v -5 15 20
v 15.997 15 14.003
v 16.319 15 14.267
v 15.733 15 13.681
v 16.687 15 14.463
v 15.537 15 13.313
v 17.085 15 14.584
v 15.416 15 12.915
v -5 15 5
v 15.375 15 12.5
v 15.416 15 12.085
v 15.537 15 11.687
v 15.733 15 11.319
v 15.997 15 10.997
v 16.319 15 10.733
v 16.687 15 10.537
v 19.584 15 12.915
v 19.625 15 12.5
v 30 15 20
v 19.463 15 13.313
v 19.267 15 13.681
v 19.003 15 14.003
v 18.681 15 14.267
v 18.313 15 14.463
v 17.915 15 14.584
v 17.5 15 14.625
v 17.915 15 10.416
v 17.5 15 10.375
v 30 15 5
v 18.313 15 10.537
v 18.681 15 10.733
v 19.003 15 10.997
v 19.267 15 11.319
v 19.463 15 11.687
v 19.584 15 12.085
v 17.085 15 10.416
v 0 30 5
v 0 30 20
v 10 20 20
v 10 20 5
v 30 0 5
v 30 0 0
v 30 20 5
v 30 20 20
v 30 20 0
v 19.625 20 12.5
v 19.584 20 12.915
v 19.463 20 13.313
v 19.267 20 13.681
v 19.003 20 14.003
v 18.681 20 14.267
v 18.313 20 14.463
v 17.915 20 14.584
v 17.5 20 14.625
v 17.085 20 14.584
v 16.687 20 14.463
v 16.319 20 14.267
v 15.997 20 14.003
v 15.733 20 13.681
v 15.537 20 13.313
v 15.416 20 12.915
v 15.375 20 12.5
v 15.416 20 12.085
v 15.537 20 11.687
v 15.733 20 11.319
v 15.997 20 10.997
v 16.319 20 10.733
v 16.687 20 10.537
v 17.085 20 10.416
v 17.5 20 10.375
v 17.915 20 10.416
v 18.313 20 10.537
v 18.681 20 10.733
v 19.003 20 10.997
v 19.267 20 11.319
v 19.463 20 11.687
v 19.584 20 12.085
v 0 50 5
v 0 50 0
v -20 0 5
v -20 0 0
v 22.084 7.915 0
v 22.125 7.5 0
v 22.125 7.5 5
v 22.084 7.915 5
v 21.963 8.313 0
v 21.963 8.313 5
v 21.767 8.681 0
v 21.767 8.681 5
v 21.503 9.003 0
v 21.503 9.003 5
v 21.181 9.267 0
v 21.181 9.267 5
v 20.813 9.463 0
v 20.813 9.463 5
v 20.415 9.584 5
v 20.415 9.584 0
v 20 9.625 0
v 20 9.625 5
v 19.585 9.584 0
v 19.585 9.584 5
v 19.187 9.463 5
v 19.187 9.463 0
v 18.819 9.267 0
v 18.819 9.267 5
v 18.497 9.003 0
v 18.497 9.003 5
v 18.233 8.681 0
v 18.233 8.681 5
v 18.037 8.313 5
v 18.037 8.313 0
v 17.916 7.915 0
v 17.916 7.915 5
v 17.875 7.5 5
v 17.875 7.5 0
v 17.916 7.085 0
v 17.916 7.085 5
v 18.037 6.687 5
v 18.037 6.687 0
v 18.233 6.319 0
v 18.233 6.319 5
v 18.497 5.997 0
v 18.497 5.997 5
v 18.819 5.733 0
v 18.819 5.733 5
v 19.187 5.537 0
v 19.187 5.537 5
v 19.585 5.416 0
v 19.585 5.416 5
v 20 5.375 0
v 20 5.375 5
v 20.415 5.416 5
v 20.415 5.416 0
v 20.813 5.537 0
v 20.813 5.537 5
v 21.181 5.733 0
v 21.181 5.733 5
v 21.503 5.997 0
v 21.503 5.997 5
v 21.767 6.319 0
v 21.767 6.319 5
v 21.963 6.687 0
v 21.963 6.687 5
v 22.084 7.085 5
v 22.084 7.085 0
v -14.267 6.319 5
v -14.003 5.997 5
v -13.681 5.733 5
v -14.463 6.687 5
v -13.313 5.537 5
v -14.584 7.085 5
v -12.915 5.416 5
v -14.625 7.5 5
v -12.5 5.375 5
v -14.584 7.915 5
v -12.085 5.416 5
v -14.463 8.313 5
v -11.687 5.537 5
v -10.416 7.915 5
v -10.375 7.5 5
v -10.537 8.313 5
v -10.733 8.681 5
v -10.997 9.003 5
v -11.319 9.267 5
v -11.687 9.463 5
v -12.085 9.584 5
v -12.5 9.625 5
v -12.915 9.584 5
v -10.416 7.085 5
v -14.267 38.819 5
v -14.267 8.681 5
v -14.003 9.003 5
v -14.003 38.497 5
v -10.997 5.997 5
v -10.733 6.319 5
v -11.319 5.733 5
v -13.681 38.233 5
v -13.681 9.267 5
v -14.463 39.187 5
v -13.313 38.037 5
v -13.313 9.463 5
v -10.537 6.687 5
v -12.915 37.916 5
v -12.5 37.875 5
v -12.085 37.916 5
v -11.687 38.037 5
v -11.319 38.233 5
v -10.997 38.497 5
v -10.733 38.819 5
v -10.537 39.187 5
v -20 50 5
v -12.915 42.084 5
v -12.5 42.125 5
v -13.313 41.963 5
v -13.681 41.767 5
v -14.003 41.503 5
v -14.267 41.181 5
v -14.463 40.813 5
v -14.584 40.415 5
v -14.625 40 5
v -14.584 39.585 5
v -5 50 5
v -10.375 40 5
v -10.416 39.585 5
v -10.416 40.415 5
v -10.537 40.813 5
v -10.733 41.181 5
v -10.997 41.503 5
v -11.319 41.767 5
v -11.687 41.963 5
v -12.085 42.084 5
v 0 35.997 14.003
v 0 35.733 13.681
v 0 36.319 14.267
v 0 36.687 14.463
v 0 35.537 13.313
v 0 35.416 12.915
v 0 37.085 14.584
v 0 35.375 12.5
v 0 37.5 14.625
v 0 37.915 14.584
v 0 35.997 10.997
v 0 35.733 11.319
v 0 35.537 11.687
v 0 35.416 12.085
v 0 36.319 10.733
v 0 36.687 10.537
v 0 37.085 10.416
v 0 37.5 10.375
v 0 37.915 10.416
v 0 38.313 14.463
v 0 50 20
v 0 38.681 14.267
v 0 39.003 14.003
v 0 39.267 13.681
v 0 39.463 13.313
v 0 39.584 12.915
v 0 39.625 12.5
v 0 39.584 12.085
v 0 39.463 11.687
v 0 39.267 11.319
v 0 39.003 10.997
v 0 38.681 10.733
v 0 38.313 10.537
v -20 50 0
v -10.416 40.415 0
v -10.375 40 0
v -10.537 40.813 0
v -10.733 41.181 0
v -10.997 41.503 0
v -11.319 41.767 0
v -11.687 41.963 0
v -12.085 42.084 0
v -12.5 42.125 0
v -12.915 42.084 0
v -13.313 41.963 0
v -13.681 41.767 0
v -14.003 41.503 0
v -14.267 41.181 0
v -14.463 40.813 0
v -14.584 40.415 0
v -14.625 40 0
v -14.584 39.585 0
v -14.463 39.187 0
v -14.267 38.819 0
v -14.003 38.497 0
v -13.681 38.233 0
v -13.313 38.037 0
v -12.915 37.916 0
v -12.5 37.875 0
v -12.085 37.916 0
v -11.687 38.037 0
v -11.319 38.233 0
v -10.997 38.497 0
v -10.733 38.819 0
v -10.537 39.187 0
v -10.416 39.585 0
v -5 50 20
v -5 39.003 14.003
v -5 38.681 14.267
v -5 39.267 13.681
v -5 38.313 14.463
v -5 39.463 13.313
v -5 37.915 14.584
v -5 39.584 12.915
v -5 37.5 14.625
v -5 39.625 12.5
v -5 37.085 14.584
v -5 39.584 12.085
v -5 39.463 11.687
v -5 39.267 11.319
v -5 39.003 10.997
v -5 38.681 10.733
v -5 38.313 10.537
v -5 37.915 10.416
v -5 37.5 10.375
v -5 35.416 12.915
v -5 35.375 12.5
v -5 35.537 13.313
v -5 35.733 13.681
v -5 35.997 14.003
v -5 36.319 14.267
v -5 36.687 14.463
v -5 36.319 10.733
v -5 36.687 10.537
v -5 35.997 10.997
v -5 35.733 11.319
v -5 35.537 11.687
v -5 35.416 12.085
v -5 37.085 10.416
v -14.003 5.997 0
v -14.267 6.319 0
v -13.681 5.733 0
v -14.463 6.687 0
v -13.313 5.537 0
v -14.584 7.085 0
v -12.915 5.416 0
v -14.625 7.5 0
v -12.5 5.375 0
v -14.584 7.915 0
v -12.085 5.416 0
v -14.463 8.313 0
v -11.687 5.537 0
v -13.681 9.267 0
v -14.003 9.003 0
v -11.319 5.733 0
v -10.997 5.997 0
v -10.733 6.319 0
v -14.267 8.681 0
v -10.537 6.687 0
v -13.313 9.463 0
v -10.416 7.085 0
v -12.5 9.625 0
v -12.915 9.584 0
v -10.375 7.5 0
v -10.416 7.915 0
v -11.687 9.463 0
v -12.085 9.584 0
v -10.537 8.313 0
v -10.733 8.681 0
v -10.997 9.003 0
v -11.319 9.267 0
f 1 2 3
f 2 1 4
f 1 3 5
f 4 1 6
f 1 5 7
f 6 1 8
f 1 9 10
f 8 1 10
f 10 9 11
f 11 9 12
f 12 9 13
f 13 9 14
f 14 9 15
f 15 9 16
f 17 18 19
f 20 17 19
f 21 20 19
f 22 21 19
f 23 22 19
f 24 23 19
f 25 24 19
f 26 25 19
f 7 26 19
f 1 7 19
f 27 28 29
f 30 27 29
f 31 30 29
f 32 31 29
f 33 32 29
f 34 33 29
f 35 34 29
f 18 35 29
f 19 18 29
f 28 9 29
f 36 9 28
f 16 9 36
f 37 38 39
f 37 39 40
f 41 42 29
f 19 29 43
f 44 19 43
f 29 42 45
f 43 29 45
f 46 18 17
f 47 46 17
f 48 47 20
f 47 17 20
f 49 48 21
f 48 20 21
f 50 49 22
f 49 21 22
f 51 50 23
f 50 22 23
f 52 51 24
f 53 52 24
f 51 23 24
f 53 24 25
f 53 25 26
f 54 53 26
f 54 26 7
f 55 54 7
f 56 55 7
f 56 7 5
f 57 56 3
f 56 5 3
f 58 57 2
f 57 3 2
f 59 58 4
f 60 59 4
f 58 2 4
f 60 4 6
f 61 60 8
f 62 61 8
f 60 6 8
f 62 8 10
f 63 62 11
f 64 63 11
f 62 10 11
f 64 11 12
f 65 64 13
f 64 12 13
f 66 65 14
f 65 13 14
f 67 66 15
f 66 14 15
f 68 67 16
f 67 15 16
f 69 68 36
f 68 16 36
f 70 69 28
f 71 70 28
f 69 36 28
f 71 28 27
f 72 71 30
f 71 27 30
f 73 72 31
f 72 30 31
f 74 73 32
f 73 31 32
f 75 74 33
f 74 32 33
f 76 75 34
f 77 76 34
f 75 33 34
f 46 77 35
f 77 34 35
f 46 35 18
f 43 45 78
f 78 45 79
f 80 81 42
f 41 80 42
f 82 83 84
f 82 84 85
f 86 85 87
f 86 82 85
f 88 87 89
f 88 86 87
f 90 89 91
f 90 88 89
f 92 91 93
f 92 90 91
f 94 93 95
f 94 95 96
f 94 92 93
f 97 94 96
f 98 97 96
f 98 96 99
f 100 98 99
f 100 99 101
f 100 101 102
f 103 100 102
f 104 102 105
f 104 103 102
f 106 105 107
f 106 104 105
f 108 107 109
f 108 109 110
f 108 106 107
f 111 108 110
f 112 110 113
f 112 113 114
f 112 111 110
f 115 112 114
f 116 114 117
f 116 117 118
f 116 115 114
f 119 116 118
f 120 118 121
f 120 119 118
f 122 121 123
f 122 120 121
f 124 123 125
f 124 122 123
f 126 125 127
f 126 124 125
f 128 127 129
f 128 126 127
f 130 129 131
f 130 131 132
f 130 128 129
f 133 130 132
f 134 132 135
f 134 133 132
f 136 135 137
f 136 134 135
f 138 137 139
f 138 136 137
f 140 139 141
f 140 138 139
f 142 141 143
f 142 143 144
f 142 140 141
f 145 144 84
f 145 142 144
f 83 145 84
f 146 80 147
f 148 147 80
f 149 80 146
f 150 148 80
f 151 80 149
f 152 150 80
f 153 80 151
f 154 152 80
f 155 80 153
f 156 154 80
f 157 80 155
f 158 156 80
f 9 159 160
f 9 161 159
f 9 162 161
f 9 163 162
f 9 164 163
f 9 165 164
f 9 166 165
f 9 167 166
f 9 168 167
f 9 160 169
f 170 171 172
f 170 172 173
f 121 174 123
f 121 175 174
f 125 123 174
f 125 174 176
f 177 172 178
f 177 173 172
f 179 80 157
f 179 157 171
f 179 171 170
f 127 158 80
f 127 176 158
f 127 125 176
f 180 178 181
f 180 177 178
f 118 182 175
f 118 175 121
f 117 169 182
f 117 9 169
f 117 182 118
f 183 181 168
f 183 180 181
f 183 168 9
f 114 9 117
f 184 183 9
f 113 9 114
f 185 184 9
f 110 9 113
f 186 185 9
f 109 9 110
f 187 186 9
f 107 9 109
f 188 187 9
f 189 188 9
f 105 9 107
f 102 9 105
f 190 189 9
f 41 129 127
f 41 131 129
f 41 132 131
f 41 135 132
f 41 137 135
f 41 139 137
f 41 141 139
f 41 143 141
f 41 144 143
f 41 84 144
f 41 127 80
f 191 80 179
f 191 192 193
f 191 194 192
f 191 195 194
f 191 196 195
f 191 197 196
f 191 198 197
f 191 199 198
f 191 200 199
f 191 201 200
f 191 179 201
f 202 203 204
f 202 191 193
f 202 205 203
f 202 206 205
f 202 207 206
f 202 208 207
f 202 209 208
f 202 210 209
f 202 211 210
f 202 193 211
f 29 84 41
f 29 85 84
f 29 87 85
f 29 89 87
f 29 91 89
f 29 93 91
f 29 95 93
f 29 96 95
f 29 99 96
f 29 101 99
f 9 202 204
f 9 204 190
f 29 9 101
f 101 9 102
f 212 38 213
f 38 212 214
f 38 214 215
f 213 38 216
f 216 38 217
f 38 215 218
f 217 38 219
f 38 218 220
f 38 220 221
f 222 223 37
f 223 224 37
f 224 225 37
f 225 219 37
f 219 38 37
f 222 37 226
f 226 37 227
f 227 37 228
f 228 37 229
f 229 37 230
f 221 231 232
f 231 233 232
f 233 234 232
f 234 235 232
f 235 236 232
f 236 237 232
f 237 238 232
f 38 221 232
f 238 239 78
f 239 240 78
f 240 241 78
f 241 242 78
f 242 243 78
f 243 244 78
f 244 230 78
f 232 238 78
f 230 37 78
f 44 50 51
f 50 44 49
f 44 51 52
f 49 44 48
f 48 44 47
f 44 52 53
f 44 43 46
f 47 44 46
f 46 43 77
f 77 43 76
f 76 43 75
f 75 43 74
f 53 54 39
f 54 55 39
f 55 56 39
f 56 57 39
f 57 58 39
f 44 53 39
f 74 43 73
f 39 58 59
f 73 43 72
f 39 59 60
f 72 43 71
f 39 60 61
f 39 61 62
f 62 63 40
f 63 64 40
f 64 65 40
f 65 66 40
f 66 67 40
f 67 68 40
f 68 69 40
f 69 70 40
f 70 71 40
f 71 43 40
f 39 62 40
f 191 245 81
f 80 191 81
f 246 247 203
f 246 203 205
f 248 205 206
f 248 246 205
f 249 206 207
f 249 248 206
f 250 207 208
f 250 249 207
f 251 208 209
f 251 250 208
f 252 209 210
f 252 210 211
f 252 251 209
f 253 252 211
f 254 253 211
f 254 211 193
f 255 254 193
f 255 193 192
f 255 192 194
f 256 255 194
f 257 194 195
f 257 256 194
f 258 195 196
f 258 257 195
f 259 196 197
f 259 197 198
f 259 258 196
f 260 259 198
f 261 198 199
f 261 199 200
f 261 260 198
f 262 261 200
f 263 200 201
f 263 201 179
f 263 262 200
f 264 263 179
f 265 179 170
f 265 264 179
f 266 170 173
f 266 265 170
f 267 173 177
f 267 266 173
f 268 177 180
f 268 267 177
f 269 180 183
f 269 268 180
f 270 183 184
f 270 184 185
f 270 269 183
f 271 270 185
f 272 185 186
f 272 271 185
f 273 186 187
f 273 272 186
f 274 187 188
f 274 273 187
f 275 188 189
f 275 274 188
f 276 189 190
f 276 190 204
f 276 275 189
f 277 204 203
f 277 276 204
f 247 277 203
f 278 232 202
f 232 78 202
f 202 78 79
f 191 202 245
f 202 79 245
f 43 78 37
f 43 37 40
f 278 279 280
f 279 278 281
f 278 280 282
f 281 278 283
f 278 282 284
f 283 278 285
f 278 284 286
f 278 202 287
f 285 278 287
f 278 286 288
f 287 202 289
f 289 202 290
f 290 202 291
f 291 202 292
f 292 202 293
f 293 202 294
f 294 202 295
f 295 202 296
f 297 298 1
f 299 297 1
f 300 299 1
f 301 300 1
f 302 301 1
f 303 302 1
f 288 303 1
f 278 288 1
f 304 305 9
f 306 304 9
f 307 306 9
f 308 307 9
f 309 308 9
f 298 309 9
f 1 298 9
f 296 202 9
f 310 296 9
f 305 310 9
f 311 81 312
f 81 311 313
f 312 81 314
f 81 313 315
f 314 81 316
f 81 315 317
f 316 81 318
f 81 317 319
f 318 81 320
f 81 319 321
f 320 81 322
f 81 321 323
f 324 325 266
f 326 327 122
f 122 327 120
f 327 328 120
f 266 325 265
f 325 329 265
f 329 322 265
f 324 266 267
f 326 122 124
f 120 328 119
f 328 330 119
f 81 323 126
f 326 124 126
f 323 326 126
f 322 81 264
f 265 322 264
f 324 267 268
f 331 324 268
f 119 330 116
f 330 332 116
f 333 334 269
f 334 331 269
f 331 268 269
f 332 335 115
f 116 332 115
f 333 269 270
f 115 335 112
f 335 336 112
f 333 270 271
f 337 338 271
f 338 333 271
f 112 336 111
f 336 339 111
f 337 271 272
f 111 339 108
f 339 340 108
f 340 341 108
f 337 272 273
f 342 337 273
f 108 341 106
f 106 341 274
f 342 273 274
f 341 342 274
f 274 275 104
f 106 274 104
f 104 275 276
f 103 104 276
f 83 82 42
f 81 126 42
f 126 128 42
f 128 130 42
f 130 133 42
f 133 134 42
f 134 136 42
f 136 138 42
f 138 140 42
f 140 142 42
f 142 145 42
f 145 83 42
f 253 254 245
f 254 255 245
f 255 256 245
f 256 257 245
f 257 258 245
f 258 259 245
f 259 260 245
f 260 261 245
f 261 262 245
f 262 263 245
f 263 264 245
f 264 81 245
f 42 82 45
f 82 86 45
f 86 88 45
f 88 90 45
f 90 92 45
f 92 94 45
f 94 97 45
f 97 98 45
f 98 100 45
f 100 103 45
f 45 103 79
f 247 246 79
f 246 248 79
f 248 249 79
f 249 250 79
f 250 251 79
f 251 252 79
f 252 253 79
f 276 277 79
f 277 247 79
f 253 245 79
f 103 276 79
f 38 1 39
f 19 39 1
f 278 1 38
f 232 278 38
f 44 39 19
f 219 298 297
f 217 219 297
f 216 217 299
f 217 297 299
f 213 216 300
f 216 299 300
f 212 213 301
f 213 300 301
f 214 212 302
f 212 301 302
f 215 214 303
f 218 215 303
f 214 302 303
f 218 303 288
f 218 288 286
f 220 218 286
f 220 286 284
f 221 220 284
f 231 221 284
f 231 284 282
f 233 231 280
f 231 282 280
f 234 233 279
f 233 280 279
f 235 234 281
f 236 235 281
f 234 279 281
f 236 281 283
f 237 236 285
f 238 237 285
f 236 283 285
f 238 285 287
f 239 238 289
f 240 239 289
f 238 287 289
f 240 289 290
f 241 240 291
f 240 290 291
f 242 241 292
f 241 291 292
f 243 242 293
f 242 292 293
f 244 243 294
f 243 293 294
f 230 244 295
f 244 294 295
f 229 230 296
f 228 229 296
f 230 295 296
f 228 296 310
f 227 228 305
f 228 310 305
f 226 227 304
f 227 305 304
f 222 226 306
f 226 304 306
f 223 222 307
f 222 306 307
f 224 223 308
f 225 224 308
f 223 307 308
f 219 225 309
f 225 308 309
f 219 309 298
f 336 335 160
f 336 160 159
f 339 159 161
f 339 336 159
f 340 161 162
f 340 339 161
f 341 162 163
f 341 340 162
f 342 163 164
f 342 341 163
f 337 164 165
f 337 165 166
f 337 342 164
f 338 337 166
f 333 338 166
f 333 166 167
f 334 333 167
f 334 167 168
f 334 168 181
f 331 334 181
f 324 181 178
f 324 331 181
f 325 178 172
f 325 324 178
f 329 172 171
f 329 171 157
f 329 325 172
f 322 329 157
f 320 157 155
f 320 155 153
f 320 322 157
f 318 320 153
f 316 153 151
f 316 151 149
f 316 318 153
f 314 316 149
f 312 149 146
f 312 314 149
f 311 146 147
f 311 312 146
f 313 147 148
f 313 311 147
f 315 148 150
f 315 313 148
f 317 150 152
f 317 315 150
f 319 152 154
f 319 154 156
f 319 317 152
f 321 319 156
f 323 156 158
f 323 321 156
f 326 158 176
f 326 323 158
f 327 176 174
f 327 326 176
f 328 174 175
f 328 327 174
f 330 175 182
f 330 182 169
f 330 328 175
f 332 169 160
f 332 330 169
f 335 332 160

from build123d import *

# Parameters (mm, degrees)
F0_R     = 2.125
F1_DEPTH = 5
F3_DEPTH = 15
F4_R     = 2.125
F5_DEPTH = 5
F6_R     = 2.125
F7_DEPTH = 5
F9_DEPTH = 5
F10_SIZE = 10


with BuildPart() as f1:
    # F0 (on Top) → F1 (new body)
    with BuildSketch(Plane.XY):
        Polygon((0, 20), (0, 50), (-20, 50), (-20, 0), (30, 0), (30, 20), align=None)
        with Locations((-12.5, 7.5)):
            Circle(F0_R, mode=Mode.SUBTRACT)
        with Locations((20, 7.5)):
            Circle(F0_R, mode=Mode.SUBTRACT)
        with Locations((-12.5, 40)):
            Circle(F0_R, mode=Mode.SUBTRACT)
    extrude(amount=F1_DEPTH)

    # F2 (on face) → F3 (join)
    with BuildSketch(Plane.XY.offset(5)):
        Polygon((0, 20), (0, 50), (-5, 50), (-5, 15), (30, 15), (30, 20), align=None)
    extrude(amount=F3_DEPTH)

    # F4 (on face) → F5 (cut)
    with BuildSketch(Plane(origin=(-5, 0, 0), x_dir=(0, -1, 0), z_dir=(-1, 0, 0))):
        with Locations((-37.5, 12.5)):
            Circle(F4_R)
    extrude(amount=-F5_DEPTH, mode=Mode.SUBTRACT)

    # F6 (on face) → F7 (cut)
    with BuildSketch(Plane.XZ.offset(-15)):
        with Locations((17.5, 12.5)):
            Circle(F6_R)
    extrude(amount=-F7_DEPTH, mode=Mode.SUBTRACT)

    # F8 (on Top) → F9 (join)
    with BuildSketch(Plane.XY):
        Polygon((30, 20), (0, 50), (0, 20), align=None)
    extrude(amount=F9_DEPTH)

    # F10
    f10_edges = [f1.edges().sort_by_distance(p)[0] for p in [
        (0, 20, 12.5),
    ]]
    chamfer(f10_edges, length=F10_SIZE)


solid = f1.part
